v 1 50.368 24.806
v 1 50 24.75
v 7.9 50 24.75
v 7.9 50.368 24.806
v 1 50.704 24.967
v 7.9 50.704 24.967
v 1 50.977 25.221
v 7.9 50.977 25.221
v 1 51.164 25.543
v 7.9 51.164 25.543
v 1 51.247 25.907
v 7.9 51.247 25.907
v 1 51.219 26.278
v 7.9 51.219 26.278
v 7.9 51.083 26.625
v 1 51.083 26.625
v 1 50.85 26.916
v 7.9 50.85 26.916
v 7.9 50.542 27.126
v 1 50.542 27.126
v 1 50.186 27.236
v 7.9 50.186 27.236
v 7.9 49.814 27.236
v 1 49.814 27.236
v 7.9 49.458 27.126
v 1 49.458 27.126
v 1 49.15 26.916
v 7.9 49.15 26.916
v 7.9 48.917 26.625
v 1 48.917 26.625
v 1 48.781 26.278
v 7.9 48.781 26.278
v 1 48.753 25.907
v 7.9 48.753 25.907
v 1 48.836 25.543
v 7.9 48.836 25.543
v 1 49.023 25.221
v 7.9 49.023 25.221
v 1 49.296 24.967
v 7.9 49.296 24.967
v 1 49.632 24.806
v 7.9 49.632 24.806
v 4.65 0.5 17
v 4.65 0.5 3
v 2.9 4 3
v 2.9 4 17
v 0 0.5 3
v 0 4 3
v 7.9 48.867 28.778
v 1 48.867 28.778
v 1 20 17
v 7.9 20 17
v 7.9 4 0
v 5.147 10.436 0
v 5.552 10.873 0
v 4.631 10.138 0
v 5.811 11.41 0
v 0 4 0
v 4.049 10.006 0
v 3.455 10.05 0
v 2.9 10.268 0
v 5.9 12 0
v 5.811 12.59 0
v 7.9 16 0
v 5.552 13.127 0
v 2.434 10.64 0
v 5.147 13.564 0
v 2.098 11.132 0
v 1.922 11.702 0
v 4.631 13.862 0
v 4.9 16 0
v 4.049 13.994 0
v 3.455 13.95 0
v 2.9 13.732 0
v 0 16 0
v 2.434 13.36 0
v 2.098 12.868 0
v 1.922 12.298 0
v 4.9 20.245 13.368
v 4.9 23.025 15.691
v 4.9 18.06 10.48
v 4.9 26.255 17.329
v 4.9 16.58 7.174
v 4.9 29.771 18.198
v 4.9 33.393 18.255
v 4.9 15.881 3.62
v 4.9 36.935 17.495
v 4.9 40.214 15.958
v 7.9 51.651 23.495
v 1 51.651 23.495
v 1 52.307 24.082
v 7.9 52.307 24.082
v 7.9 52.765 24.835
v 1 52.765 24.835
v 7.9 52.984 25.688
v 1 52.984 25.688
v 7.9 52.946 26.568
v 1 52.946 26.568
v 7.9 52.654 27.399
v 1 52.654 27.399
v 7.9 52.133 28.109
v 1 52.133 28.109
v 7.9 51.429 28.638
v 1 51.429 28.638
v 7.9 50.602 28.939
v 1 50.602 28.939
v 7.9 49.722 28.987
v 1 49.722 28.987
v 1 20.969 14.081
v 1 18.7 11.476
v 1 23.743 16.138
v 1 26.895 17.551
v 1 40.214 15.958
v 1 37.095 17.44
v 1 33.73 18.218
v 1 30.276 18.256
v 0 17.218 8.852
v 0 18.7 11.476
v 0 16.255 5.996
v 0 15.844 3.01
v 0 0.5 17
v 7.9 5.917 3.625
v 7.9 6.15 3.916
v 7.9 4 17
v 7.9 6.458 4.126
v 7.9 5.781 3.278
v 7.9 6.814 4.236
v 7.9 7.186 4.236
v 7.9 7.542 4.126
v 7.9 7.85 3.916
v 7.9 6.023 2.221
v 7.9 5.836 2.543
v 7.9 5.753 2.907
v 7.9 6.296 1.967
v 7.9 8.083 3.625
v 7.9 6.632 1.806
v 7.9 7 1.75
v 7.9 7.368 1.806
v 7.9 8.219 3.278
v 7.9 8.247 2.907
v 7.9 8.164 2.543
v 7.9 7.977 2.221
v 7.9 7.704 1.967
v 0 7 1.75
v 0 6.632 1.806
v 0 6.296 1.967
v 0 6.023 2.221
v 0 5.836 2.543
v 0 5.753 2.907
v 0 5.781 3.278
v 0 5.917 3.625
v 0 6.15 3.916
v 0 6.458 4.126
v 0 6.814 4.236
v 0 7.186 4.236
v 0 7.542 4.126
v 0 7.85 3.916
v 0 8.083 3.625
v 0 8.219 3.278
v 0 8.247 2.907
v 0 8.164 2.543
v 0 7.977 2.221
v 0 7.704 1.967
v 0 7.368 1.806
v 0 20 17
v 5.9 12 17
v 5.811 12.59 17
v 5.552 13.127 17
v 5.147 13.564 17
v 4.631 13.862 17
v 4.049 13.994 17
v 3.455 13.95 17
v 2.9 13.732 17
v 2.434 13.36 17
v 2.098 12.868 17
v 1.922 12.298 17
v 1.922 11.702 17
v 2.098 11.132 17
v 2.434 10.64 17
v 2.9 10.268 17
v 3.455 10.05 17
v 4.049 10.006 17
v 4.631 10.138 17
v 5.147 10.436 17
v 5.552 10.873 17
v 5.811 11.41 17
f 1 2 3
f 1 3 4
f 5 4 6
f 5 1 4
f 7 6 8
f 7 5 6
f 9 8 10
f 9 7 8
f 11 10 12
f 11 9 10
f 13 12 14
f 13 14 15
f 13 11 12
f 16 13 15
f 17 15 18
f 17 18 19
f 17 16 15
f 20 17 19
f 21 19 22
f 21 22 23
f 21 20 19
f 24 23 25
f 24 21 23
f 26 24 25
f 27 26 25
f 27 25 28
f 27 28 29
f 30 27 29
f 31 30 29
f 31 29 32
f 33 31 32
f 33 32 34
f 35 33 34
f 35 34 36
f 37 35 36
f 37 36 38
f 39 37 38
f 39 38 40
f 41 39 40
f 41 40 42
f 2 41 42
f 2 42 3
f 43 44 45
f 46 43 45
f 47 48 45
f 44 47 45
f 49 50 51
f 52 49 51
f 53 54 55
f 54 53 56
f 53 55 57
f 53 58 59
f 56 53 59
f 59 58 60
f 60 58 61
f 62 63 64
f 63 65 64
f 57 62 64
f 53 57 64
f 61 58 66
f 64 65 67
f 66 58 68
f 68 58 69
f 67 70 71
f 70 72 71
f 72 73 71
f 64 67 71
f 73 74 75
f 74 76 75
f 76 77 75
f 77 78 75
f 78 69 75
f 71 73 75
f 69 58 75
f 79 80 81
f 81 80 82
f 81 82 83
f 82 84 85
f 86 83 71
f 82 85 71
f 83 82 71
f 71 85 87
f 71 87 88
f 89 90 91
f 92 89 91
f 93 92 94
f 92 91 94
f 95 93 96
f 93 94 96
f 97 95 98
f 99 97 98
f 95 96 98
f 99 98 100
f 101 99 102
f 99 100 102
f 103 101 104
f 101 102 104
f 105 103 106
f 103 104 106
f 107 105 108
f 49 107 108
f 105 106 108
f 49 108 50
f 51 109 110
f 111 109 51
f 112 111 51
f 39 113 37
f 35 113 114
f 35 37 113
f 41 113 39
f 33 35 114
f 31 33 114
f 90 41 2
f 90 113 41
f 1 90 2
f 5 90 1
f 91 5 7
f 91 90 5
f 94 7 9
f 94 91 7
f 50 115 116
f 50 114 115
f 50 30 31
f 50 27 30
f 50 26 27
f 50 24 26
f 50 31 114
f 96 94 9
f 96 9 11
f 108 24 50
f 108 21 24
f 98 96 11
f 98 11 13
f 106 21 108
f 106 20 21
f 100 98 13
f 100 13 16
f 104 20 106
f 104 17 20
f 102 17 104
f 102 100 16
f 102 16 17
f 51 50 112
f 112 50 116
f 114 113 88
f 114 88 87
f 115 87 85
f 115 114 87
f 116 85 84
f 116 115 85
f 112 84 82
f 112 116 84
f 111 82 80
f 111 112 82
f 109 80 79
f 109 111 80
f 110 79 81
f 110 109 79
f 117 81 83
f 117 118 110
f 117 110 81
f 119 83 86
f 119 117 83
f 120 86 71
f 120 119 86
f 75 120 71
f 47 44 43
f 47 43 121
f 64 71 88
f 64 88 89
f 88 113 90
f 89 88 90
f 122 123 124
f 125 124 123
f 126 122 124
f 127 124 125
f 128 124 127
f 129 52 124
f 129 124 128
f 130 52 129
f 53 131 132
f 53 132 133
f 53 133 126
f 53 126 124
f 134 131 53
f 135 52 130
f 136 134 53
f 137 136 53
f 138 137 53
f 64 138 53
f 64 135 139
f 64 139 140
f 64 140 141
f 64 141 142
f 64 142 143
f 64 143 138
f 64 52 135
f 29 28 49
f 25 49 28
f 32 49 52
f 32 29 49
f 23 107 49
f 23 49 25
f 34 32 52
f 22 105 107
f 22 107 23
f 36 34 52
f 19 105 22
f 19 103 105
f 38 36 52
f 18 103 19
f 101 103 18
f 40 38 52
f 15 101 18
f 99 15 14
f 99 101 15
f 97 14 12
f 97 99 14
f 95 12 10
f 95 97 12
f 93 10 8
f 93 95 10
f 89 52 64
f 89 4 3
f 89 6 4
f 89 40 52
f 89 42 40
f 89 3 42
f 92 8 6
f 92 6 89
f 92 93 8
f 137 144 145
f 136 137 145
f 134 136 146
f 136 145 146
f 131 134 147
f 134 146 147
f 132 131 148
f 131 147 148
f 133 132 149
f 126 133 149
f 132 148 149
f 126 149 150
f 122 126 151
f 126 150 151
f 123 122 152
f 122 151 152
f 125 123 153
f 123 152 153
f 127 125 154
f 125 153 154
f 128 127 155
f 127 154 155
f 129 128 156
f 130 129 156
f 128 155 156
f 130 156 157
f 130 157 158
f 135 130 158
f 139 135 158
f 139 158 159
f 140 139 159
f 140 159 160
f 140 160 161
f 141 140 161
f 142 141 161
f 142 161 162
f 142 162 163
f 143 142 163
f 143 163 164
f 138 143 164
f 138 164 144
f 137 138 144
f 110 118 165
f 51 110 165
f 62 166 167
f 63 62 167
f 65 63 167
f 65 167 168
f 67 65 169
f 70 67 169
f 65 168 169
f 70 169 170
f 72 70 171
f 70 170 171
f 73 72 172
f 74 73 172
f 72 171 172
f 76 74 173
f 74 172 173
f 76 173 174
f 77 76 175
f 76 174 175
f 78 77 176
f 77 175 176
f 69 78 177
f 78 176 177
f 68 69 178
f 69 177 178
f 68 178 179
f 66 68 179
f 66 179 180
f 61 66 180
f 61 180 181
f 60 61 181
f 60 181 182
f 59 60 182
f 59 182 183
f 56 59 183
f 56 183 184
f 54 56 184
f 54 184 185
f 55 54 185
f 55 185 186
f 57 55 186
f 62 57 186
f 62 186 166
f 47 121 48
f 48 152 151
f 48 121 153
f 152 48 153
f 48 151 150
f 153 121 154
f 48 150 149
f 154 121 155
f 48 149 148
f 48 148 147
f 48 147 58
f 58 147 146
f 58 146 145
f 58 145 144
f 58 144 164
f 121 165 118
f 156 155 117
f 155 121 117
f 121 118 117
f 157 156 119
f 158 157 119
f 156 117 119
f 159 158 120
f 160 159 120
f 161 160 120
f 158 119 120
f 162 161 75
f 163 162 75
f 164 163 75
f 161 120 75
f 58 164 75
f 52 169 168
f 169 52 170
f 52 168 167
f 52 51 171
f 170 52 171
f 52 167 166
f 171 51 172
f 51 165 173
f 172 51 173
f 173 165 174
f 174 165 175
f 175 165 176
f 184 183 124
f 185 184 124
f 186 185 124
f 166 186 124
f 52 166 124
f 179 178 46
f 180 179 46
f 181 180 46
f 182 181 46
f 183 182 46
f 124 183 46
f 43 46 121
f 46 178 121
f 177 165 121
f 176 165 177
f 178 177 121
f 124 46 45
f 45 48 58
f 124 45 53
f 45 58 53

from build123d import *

# Parameters (mm, degrees)
SKETCH1_R             = 1.25
BOSS_EXTRUDE1_DEPTH   = 7.9
CUT_EXTRUDE2_DEPTH    = 61.929549481
M3X0_5_TAPPED_HOLE1_D = 2.5
SKETCH7_W             = 8
SKETCH7_H             = 0.5
CUT_EXTRUDE3_DEPTH    = 61.929549481
SKETCH8_R             = 2
CUT_EXTRUDE4_DEPTH    = 57.217523958
CUT_EXTRUDE5_DEPTH    = 3
CUT_EXTRUDE6_DEPTH    = 1
CUT_EXTRUDE8_DEPTH    = 3.9


with BuildPart() as part:
    # Sketch1 → Boss-Extrude1 (new body)
    with BuildSketch(Plane(origin=(0, 0, 0), x_dir=(0, 0, -1), z_dir=(1, 0, 0))):
        with BuildLine():
            Line((0, 0), (0, 16))
            Line((0, 16), (-23.49505807, 51.650837947))
            ThreePointArc((-23.49505807, 51.650837947), (-27.398738146, 52.653965259), (-28.777698581, 48.866690426))
            Line((-28.777698581, 48.866690426), (-17, 20))
            Line((-17, 20), (-17, 0))
            Line((-17, 0), (0, 0))
        make_face()
        with Locations((-26, 50)):
            Circle(SKETCH1_R, mode=Mode.SUBTRACT)
    extrude(amount=BOSS_EXTRUDE1_DEPTH)

    # Sketch3 → Cut-Extrude2 (cut, through all)
    with BuildSketch(Plane(origin=(0, 0, 0), x_dir=(-1, 0, 0), z_dir=(0, 0, -1))):
        Polygon((-7.9, 0), (-4.9, 0), (-2.9, 4), (-7.9, 4), align=None)
    extrude(amount=-CUT_EXTRUDE2_DEPTH, mode=Mode.SUBTRACT)

    # M3x0.5 Tapped Hole1 (through all)
    with Locations(Plane(origin=(7.9, 7, 3), x_dir=(0, 0, 1), z_dir=(1, 0, 0))):
        with Locations((0, 0)):
            Hole(M3X0_5_TAPPED_HOLE1_D / 2)

    # Sketch7 → Cut-Extrude3 (cut, through all)
    with BuildSketch(Plane(origin=(0, 0, 0), x_dir=(-1, 0, 0), z_dir=(0, 0, -1))):
        with Locations((-4, 0.25)):
            Rectangle(SKETCH7_W, SKETCH7_H)
    extrude(amount=-CUT_EXTRUDE3_DEPTH, mode=Mode.SUBTRACT)

    # Sketch8 → Cut-Extrude4 (cut, through all)
    with BuildSketch(Plane.XY.offset(17)):
        with Locations((3.9, 12)):
            Circle(SKETCH8_R)
    extrude(amount=-CUT_EXTRUDE4_DEPTH, mode=Mode.SUBTRACT)

    # Sketch9 → Cut-Extrude5 (cut)
    with BuildSketch(Plane(origin=(0, 0, 0), x_dir=(-1, 0, 0), z_dir=(0, 0, -1))):
        Polygon((-4.65, 0.5), (-2.9, 4), (0, 4), (0, 0.5), align=None)
    extrude(amount=-CUT_EXTRUDE5_DEPTH, mode=Mode.SUBTRACT)

    # Sketch11 → Cut-Extrude6 (cut)
    with BuildSketch(Plane.ZY):
        with BuildLine():
            Line((0, 16), (17, 20))
            Line((17, 20), (28.777698581, 48.866690426))
            ThreePointArc((28.777698581, 48.866690426), (27.398738146, 52.653965259), (23.49505807, 51.650837947))
            Line((23.49505807, 51.650837947), (0, 16))
        make_face()
    extrude(amount=-CUT_EXTRUDE6_DEPTH, mode=Mode.SUBTRACT)

    # Sketch14 → Cut-Extrude8 (cut, symmetric)
    with BuildSketch(Plane.ZY.offset(-1)):
        with BuildLine():
            Line((0, 16), (15.958100151, 40.214438659))
            ThreePointArc((15.958100151, 40.214438659), (15.69103598, 23.024770582), (0, 16))
        make_face()
    extrude(amount=CUT_EXTRUDE8_DEPTH, both=True, mode=Mode.SUBTRACT)


solid = part.part
